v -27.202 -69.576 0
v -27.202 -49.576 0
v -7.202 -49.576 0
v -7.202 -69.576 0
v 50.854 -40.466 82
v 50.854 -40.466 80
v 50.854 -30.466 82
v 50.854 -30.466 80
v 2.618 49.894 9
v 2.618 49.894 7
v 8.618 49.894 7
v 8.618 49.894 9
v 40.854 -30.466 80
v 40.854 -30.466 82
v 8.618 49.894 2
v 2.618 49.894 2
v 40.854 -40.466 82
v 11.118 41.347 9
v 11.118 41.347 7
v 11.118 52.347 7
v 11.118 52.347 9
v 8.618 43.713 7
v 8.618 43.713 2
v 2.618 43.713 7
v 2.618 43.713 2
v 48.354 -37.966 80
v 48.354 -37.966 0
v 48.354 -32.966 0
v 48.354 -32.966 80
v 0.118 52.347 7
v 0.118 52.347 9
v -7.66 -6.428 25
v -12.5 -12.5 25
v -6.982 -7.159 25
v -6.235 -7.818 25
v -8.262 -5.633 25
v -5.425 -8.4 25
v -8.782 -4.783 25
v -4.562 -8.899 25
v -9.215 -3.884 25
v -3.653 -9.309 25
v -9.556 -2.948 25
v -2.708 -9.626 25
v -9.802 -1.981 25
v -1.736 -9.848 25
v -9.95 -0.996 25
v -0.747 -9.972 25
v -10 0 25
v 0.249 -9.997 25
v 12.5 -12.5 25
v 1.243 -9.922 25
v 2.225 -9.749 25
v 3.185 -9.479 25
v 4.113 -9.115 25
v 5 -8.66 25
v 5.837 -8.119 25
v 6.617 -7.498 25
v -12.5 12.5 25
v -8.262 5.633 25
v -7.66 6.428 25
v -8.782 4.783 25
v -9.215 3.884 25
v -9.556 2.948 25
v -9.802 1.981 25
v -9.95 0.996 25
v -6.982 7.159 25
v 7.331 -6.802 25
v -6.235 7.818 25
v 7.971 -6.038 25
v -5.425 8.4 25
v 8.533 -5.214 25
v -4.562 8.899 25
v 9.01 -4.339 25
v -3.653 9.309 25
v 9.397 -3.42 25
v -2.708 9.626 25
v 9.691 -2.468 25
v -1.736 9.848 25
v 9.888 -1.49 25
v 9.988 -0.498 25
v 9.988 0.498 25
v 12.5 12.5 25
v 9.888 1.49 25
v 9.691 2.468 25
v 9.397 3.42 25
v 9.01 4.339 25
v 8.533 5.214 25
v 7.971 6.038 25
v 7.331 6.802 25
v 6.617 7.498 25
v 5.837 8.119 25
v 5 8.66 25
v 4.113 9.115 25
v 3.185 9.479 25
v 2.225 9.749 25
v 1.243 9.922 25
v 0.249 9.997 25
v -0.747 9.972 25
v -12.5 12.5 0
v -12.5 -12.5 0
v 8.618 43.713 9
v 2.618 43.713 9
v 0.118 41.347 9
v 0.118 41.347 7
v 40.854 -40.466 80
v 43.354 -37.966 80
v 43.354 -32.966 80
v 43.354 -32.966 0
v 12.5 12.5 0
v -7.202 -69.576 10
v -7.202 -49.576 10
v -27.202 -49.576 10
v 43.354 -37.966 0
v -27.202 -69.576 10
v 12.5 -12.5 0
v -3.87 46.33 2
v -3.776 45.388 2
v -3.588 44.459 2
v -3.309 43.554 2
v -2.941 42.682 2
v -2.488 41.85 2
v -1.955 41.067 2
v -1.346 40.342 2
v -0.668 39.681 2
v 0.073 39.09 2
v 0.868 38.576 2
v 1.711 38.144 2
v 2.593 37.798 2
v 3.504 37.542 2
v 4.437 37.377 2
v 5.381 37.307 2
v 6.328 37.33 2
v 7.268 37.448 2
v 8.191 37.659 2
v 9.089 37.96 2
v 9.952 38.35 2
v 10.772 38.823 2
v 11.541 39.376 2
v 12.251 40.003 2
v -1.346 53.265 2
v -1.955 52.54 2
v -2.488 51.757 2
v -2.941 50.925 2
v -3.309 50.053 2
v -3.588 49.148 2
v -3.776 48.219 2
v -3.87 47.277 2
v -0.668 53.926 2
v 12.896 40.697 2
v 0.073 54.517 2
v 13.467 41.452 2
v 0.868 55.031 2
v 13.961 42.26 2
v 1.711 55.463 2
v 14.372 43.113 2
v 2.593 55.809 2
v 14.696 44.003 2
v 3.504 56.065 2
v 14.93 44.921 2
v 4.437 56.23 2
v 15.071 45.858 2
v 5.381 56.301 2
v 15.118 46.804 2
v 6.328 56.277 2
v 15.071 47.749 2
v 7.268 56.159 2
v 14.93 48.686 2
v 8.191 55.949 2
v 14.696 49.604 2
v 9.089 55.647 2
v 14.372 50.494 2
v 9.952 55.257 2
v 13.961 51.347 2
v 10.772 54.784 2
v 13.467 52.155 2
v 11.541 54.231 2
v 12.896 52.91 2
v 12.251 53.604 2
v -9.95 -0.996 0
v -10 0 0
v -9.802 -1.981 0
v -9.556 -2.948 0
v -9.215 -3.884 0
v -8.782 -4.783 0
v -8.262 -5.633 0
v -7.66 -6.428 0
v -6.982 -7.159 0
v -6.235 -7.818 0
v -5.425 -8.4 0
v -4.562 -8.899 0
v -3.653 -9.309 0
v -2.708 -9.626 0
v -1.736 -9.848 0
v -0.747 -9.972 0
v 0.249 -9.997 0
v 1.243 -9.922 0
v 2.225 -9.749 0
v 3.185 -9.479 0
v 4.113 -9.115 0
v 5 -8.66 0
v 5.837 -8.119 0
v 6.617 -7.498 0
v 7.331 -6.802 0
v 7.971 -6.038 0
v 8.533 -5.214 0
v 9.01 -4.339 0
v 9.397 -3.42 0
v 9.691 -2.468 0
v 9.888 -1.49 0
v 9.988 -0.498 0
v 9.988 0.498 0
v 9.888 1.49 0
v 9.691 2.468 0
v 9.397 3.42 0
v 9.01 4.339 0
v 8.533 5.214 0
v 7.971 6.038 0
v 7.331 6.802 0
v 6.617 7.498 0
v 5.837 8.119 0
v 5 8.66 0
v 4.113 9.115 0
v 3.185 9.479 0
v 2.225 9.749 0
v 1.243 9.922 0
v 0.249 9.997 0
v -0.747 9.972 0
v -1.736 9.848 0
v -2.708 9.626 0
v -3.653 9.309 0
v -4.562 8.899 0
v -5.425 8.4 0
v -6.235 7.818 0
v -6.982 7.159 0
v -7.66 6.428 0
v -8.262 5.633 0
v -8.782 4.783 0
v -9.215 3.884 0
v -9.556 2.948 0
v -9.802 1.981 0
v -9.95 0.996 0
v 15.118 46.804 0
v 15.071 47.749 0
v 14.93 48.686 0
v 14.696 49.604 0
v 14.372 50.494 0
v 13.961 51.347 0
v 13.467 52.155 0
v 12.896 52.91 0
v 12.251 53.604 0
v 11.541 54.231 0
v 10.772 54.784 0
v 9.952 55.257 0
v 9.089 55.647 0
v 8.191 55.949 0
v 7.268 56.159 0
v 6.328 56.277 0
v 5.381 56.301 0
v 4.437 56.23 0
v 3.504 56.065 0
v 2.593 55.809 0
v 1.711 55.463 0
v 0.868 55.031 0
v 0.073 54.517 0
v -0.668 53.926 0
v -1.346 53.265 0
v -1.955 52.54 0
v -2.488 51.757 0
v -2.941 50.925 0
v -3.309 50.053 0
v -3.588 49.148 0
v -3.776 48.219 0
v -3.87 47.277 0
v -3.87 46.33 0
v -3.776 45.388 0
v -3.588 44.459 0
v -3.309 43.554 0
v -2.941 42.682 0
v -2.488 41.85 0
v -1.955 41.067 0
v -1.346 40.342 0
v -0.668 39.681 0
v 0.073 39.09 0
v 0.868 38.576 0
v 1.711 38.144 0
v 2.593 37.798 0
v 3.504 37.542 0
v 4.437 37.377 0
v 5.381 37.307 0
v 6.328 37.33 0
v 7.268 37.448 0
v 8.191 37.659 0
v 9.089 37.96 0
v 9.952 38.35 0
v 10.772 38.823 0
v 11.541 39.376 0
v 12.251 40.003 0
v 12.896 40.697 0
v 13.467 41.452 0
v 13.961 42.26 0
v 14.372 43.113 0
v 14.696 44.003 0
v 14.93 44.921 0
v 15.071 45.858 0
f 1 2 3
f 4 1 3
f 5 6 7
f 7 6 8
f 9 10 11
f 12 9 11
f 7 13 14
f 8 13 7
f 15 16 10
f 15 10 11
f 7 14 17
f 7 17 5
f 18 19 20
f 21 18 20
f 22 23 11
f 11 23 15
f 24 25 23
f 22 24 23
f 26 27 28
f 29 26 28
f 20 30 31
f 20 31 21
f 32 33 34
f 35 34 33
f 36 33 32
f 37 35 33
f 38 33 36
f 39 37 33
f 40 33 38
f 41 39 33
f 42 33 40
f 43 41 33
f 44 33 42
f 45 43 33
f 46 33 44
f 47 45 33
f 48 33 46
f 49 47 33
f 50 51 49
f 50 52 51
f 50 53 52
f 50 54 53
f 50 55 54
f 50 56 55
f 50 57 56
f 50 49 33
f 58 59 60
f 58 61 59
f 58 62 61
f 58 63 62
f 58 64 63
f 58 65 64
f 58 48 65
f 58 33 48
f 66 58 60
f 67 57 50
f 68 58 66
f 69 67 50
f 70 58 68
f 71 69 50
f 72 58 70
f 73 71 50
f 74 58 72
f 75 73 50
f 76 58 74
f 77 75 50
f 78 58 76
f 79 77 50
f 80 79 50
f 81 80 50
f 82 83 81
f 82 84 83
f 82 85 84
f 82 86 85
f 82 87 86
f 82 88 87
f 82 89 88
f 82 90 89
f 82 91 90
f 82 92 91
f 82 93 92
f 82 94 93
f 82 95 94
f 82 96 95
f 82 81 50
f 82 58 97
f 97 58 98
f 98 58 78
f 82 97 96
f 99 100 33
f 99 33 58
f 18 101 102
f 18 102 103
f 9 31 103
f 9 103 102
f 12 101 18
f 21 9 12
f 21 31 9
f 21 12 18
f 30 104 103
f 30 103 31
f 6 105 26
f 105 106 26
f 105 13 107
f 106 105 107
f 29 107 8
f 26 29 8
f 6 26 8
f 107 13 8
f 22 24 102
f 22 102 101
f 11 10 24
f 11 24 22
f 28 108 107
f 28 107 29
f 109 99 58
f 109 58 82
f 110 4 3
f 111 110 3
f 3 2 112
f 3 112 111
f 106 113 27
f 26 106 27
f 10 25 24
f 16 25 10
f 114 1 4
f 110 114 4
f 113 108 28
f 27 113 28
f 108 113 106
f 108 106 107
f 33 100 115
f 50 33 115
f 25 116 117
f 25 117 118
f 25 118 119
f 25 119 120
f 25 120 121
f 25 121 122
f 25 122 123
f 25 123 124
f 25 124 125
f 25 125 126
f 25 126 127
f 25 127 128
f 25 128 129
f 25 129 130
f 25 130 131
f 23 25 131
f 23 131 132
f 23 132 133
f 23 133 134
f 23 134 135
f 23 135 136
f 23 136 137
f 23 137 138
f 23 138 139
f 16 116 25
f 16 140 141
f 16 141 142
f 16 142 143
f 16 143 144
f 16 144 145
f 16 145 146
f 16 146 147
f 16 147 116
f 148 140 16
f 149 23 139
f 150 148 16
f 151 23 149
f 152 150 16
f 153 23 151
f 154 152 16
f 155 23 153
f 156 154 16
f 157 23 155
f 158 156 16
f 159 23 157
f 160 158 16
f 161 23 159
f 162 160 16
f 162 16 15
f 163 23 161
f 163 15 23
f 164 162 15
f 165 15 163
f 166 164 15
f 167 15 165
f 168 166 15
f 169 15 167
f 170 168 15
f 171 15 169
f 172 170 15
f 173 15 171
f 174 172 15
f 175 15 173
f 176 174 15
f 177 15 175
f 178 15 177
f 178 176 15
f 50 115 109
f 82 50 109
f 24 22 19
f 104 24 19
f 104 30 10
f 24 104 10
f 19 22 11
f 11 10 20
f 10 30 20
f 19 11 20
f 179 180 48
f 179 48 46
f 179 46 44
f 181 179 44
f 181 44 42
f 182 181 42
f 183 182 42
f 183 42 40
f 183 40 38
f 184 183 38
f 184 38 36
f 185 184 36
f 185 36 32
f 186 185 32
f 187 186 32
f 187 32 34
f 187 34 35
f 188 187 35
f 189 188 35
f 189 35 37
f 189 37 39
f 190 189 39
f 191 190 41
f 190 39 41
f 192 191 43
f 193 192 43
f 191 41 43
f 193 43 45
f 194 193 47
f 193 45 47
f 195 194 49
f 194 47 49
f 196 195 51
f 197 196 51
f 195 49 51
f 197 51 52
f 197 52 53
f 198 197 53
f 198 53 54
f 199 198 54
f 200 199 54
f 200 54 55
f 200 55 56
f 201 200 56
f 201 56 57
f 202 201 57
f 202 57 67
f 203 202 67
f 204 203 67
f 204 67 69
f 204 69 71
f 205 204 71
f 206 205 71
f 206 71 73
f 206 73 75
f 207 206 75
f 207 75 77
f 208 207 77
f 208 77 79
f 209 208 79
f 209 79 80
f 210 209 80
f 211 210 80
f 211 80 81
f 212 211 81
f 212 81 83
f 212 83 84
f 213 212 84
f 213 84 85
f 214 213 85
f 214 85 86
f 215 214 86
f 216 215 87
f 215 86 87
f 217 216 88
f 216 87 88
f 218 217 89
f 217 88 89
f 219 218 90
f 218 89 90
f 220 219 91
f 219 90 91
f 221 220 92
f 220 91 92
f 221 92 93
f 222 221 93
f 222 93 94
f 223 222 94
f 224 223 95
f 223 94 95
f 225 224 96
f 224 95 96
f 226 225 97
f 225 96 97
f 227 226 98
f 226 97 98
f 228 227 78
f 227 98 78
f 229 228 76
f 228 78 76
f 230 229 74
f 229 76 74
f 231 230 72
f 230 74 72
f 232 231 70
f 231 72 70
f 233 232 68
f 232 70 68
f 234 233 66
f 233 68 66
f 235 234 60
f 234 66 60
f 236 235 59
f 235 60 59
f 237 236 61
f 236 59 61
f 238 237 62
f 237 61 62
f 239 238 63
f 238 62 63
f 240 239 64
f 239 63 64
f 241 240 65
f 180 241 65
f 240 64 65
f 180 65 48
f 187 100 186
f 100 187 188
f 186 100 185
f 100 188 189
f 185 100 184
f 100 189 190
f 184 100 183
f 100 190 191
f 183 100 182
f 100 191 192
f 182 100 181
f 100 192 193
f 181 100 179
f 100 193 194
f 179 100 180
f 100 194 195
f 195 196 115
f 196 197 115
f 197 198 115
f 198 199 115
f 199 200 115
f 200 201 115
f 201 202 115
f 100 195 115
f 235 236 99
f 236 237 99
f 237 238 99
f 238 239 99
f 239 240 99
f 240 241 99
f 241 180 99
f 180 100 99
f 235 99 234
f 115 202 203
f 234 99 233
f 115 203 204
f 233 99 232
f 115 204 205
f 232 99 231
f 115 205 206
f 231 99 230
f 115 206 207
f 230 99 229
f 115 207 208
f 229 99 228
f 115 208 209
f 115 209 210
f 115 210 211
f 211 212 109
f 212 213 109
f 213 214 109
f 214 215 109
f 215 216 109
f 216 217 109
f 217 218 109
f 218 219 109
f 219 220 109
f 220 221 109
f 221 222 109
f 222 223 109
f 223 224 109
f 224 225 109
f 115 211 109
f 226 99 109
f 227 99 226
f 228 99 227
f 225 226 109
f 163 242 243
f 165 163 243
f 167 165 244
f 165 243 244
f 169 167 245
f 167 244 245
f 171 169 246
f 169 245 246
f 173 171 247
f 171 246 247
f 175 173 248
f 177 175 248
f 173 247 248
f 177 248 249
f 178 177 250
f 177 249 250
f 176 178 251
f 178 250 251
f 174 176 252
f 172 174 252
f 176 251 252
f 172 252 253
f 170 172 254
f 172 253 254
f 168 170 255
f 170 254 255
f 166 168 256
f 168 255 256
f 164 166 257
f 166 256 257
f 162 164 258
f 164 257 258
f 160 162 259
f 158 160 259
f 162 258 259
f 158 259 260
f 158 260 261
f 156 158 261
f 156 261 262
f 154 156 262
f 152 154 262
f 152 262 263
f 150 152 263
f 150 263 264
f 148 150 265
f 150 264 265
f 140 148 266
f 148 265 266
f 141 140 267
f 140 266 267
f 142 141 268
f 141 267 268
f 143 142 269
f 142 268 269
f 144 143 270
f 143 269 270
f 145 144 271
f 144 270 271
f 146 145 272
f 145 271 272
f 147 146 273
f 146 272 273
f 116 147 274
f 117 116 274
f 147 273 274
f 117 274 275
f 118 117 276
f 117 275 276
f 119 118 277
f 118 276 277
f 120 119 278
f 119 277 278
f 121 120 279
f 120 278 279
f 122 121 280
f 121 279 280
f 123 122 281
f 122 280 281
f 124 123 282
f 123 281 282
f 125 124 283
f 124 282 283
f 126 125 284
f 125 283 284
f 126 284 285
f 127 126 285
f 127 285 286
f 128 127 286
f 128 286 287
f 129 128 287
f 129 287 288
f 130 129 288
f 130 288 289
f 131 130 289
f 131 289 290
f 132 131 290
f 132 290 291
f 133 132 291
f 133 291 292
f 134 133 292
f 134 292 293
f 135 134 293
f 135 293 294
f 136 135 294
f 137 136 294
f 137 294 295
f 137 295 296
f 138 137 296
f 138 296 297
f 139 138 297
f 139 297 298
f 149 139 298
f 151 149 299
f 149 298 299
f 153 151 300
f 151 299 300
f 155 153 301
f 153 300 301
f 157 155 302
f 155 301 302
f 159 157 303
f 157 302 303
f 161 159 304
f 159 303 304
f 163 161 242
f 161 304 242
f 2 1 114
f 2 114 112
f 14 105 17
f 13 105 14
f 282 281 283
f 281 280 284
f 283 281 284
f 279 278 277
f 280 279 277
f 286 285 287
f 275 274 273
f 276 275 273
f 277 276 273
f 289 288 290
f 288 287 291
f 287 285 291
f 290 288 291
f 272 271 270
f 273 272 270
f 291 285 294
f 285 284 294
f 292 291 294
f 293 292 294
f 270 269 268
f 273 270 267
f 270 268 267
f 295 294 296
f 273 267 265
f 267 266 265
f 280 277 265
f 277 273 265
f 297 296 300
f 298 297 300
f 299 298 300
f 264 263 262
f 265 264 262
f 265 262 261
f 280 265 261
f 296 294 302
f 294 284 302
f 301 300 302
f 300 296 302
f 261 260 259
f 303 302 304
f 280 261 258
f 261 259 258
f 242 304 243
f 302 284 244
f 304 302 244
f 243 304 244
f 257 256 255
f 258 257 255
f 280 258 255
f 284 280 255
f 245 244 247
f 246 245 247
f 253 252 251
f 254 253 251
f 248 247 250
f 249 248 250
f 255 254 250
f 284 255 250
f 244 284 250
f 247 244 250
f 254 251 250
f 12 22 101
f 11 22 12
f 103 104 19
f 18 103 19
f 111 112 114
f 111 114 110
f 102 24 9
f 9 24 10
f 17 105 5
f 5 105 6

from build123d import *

# Parameters (mm, degrees)
F0_W      = 25
F0_H      = 25
F1_DEPTH  = 25
F2_D      = 20
F3_R      = 9.5
F4_DEPTH  = 2
F5_W      = 6
F5_H      = 6.1806928968
F6_DEPTH  = 5
F7_W      = 15
F7_H      = 15
F8_DEPTH  = 80
F9_W      = 5
F9_H      = 5
F10_DEPTH = 80
F12_W     = 10
F12_H     = 10
F12_W_2   = 5
F12_H_2   = 5
F13_DEPTH = 2
F14_W     = 20
F14_H     = 20
F15_DEPTH = 10
F16_W     = 11
F16_H     = 11
F16_W_2   = 6
F16_H_2   = 6.1806928968
F17_DEPTH = 2


with BuildPart() as f1:
    # F0 (on Top) → F1 (new body)
    with BuildSketch(Plane.XY):
        Rectangle(F0_W, F0_H)
    extrude(amount=F1_DEPTH)

    # F2 (through all)
    with Locations(Plane(origin=(0, 0, 0), x_dir=(1, 0, 0), z_dir=(0, 0, -1))):
        with Locations((0, 0)):
            Hole(F2_D / 2)


with BuildPart() as f4:
    # F3 (on Top) → F4 (new body)
    with BuildSketch(Plane.XY):
        with Locations((5.6182225235, 46.8035712838)):
            Circle(F3_R)
    extrude(amount=F4_DEPTH)

    # F5 (on face) → F6 (join)
    with BuildSketch(Plane.XY.offset(2)):
        with Locations((5.6182225235, 46.8035712838)):
            Rectangle(F5_W, F5_H)
    extrude(amount=F6_DEPTH)


with BuildPart() as f8:
    # F7 (on Top) → F8 (new body)
    with BuildSketch(Plane.XY):
        with Locations((1.6906128443, -58.413207531)):
            Rectangle(F7_W, F7_H)
    extrude(amount=F8_DEPTH)


with BuildPart() as f10:
    # F9 (on Top) → F10 (new body)
    with BuildSketch(Plane.XY):
        with Locations((45.8536446095, -35.4659261686)):
            Rectangle(F9_W, F9_H)
    extrude(amount=F10_DEPTH)

    # F12 (on face) → F13 (join)
    with BuildSketch(Plane.XY.offset(80)):
        with Locations((45.8536446095, -35.4659261686)):
            Rectangle(F12_W, F12_H)
        with Locations((45.8536446095, -35.4659261686)):
            Rectangle(F12_W_2, F12_H_2, mode=Mode.SUBTRACT)
        with Locations((45.8536446095, -35.4659261686)):
            Rectangle(F12_W_2, F12_H_2)
    extrude(amount=F13_DEPTH)


with BuildPart() as f15:
    # F14 (on Top) → F15 (new body)
    with BuildSketch(Plane.XY):
        with Locations((-17.2017511346, -59.575650841)):
            Rectangle(F14_W, F14_H)
    extrude(amount=F15_DEPTH)


with BuildPart() as f17:
    # F16 (on face) → F17 (new body)
    with BuildSketch(Plane.XY.offset(7)):
        with Locations((5.6182225235, 46.8469336629)):
            Rectangle(F16_W, F16_H)
        with Locations((5.6182225235, 46.8035712838)):
            Rectangle(F16_W_2, F16_H_2, mode=Mode.SUBTRACT)
    extrude(amount=F17_DEPTH)


solid = Compound([f1.part, f4.part, f10.part, f15.part, f17.part])
